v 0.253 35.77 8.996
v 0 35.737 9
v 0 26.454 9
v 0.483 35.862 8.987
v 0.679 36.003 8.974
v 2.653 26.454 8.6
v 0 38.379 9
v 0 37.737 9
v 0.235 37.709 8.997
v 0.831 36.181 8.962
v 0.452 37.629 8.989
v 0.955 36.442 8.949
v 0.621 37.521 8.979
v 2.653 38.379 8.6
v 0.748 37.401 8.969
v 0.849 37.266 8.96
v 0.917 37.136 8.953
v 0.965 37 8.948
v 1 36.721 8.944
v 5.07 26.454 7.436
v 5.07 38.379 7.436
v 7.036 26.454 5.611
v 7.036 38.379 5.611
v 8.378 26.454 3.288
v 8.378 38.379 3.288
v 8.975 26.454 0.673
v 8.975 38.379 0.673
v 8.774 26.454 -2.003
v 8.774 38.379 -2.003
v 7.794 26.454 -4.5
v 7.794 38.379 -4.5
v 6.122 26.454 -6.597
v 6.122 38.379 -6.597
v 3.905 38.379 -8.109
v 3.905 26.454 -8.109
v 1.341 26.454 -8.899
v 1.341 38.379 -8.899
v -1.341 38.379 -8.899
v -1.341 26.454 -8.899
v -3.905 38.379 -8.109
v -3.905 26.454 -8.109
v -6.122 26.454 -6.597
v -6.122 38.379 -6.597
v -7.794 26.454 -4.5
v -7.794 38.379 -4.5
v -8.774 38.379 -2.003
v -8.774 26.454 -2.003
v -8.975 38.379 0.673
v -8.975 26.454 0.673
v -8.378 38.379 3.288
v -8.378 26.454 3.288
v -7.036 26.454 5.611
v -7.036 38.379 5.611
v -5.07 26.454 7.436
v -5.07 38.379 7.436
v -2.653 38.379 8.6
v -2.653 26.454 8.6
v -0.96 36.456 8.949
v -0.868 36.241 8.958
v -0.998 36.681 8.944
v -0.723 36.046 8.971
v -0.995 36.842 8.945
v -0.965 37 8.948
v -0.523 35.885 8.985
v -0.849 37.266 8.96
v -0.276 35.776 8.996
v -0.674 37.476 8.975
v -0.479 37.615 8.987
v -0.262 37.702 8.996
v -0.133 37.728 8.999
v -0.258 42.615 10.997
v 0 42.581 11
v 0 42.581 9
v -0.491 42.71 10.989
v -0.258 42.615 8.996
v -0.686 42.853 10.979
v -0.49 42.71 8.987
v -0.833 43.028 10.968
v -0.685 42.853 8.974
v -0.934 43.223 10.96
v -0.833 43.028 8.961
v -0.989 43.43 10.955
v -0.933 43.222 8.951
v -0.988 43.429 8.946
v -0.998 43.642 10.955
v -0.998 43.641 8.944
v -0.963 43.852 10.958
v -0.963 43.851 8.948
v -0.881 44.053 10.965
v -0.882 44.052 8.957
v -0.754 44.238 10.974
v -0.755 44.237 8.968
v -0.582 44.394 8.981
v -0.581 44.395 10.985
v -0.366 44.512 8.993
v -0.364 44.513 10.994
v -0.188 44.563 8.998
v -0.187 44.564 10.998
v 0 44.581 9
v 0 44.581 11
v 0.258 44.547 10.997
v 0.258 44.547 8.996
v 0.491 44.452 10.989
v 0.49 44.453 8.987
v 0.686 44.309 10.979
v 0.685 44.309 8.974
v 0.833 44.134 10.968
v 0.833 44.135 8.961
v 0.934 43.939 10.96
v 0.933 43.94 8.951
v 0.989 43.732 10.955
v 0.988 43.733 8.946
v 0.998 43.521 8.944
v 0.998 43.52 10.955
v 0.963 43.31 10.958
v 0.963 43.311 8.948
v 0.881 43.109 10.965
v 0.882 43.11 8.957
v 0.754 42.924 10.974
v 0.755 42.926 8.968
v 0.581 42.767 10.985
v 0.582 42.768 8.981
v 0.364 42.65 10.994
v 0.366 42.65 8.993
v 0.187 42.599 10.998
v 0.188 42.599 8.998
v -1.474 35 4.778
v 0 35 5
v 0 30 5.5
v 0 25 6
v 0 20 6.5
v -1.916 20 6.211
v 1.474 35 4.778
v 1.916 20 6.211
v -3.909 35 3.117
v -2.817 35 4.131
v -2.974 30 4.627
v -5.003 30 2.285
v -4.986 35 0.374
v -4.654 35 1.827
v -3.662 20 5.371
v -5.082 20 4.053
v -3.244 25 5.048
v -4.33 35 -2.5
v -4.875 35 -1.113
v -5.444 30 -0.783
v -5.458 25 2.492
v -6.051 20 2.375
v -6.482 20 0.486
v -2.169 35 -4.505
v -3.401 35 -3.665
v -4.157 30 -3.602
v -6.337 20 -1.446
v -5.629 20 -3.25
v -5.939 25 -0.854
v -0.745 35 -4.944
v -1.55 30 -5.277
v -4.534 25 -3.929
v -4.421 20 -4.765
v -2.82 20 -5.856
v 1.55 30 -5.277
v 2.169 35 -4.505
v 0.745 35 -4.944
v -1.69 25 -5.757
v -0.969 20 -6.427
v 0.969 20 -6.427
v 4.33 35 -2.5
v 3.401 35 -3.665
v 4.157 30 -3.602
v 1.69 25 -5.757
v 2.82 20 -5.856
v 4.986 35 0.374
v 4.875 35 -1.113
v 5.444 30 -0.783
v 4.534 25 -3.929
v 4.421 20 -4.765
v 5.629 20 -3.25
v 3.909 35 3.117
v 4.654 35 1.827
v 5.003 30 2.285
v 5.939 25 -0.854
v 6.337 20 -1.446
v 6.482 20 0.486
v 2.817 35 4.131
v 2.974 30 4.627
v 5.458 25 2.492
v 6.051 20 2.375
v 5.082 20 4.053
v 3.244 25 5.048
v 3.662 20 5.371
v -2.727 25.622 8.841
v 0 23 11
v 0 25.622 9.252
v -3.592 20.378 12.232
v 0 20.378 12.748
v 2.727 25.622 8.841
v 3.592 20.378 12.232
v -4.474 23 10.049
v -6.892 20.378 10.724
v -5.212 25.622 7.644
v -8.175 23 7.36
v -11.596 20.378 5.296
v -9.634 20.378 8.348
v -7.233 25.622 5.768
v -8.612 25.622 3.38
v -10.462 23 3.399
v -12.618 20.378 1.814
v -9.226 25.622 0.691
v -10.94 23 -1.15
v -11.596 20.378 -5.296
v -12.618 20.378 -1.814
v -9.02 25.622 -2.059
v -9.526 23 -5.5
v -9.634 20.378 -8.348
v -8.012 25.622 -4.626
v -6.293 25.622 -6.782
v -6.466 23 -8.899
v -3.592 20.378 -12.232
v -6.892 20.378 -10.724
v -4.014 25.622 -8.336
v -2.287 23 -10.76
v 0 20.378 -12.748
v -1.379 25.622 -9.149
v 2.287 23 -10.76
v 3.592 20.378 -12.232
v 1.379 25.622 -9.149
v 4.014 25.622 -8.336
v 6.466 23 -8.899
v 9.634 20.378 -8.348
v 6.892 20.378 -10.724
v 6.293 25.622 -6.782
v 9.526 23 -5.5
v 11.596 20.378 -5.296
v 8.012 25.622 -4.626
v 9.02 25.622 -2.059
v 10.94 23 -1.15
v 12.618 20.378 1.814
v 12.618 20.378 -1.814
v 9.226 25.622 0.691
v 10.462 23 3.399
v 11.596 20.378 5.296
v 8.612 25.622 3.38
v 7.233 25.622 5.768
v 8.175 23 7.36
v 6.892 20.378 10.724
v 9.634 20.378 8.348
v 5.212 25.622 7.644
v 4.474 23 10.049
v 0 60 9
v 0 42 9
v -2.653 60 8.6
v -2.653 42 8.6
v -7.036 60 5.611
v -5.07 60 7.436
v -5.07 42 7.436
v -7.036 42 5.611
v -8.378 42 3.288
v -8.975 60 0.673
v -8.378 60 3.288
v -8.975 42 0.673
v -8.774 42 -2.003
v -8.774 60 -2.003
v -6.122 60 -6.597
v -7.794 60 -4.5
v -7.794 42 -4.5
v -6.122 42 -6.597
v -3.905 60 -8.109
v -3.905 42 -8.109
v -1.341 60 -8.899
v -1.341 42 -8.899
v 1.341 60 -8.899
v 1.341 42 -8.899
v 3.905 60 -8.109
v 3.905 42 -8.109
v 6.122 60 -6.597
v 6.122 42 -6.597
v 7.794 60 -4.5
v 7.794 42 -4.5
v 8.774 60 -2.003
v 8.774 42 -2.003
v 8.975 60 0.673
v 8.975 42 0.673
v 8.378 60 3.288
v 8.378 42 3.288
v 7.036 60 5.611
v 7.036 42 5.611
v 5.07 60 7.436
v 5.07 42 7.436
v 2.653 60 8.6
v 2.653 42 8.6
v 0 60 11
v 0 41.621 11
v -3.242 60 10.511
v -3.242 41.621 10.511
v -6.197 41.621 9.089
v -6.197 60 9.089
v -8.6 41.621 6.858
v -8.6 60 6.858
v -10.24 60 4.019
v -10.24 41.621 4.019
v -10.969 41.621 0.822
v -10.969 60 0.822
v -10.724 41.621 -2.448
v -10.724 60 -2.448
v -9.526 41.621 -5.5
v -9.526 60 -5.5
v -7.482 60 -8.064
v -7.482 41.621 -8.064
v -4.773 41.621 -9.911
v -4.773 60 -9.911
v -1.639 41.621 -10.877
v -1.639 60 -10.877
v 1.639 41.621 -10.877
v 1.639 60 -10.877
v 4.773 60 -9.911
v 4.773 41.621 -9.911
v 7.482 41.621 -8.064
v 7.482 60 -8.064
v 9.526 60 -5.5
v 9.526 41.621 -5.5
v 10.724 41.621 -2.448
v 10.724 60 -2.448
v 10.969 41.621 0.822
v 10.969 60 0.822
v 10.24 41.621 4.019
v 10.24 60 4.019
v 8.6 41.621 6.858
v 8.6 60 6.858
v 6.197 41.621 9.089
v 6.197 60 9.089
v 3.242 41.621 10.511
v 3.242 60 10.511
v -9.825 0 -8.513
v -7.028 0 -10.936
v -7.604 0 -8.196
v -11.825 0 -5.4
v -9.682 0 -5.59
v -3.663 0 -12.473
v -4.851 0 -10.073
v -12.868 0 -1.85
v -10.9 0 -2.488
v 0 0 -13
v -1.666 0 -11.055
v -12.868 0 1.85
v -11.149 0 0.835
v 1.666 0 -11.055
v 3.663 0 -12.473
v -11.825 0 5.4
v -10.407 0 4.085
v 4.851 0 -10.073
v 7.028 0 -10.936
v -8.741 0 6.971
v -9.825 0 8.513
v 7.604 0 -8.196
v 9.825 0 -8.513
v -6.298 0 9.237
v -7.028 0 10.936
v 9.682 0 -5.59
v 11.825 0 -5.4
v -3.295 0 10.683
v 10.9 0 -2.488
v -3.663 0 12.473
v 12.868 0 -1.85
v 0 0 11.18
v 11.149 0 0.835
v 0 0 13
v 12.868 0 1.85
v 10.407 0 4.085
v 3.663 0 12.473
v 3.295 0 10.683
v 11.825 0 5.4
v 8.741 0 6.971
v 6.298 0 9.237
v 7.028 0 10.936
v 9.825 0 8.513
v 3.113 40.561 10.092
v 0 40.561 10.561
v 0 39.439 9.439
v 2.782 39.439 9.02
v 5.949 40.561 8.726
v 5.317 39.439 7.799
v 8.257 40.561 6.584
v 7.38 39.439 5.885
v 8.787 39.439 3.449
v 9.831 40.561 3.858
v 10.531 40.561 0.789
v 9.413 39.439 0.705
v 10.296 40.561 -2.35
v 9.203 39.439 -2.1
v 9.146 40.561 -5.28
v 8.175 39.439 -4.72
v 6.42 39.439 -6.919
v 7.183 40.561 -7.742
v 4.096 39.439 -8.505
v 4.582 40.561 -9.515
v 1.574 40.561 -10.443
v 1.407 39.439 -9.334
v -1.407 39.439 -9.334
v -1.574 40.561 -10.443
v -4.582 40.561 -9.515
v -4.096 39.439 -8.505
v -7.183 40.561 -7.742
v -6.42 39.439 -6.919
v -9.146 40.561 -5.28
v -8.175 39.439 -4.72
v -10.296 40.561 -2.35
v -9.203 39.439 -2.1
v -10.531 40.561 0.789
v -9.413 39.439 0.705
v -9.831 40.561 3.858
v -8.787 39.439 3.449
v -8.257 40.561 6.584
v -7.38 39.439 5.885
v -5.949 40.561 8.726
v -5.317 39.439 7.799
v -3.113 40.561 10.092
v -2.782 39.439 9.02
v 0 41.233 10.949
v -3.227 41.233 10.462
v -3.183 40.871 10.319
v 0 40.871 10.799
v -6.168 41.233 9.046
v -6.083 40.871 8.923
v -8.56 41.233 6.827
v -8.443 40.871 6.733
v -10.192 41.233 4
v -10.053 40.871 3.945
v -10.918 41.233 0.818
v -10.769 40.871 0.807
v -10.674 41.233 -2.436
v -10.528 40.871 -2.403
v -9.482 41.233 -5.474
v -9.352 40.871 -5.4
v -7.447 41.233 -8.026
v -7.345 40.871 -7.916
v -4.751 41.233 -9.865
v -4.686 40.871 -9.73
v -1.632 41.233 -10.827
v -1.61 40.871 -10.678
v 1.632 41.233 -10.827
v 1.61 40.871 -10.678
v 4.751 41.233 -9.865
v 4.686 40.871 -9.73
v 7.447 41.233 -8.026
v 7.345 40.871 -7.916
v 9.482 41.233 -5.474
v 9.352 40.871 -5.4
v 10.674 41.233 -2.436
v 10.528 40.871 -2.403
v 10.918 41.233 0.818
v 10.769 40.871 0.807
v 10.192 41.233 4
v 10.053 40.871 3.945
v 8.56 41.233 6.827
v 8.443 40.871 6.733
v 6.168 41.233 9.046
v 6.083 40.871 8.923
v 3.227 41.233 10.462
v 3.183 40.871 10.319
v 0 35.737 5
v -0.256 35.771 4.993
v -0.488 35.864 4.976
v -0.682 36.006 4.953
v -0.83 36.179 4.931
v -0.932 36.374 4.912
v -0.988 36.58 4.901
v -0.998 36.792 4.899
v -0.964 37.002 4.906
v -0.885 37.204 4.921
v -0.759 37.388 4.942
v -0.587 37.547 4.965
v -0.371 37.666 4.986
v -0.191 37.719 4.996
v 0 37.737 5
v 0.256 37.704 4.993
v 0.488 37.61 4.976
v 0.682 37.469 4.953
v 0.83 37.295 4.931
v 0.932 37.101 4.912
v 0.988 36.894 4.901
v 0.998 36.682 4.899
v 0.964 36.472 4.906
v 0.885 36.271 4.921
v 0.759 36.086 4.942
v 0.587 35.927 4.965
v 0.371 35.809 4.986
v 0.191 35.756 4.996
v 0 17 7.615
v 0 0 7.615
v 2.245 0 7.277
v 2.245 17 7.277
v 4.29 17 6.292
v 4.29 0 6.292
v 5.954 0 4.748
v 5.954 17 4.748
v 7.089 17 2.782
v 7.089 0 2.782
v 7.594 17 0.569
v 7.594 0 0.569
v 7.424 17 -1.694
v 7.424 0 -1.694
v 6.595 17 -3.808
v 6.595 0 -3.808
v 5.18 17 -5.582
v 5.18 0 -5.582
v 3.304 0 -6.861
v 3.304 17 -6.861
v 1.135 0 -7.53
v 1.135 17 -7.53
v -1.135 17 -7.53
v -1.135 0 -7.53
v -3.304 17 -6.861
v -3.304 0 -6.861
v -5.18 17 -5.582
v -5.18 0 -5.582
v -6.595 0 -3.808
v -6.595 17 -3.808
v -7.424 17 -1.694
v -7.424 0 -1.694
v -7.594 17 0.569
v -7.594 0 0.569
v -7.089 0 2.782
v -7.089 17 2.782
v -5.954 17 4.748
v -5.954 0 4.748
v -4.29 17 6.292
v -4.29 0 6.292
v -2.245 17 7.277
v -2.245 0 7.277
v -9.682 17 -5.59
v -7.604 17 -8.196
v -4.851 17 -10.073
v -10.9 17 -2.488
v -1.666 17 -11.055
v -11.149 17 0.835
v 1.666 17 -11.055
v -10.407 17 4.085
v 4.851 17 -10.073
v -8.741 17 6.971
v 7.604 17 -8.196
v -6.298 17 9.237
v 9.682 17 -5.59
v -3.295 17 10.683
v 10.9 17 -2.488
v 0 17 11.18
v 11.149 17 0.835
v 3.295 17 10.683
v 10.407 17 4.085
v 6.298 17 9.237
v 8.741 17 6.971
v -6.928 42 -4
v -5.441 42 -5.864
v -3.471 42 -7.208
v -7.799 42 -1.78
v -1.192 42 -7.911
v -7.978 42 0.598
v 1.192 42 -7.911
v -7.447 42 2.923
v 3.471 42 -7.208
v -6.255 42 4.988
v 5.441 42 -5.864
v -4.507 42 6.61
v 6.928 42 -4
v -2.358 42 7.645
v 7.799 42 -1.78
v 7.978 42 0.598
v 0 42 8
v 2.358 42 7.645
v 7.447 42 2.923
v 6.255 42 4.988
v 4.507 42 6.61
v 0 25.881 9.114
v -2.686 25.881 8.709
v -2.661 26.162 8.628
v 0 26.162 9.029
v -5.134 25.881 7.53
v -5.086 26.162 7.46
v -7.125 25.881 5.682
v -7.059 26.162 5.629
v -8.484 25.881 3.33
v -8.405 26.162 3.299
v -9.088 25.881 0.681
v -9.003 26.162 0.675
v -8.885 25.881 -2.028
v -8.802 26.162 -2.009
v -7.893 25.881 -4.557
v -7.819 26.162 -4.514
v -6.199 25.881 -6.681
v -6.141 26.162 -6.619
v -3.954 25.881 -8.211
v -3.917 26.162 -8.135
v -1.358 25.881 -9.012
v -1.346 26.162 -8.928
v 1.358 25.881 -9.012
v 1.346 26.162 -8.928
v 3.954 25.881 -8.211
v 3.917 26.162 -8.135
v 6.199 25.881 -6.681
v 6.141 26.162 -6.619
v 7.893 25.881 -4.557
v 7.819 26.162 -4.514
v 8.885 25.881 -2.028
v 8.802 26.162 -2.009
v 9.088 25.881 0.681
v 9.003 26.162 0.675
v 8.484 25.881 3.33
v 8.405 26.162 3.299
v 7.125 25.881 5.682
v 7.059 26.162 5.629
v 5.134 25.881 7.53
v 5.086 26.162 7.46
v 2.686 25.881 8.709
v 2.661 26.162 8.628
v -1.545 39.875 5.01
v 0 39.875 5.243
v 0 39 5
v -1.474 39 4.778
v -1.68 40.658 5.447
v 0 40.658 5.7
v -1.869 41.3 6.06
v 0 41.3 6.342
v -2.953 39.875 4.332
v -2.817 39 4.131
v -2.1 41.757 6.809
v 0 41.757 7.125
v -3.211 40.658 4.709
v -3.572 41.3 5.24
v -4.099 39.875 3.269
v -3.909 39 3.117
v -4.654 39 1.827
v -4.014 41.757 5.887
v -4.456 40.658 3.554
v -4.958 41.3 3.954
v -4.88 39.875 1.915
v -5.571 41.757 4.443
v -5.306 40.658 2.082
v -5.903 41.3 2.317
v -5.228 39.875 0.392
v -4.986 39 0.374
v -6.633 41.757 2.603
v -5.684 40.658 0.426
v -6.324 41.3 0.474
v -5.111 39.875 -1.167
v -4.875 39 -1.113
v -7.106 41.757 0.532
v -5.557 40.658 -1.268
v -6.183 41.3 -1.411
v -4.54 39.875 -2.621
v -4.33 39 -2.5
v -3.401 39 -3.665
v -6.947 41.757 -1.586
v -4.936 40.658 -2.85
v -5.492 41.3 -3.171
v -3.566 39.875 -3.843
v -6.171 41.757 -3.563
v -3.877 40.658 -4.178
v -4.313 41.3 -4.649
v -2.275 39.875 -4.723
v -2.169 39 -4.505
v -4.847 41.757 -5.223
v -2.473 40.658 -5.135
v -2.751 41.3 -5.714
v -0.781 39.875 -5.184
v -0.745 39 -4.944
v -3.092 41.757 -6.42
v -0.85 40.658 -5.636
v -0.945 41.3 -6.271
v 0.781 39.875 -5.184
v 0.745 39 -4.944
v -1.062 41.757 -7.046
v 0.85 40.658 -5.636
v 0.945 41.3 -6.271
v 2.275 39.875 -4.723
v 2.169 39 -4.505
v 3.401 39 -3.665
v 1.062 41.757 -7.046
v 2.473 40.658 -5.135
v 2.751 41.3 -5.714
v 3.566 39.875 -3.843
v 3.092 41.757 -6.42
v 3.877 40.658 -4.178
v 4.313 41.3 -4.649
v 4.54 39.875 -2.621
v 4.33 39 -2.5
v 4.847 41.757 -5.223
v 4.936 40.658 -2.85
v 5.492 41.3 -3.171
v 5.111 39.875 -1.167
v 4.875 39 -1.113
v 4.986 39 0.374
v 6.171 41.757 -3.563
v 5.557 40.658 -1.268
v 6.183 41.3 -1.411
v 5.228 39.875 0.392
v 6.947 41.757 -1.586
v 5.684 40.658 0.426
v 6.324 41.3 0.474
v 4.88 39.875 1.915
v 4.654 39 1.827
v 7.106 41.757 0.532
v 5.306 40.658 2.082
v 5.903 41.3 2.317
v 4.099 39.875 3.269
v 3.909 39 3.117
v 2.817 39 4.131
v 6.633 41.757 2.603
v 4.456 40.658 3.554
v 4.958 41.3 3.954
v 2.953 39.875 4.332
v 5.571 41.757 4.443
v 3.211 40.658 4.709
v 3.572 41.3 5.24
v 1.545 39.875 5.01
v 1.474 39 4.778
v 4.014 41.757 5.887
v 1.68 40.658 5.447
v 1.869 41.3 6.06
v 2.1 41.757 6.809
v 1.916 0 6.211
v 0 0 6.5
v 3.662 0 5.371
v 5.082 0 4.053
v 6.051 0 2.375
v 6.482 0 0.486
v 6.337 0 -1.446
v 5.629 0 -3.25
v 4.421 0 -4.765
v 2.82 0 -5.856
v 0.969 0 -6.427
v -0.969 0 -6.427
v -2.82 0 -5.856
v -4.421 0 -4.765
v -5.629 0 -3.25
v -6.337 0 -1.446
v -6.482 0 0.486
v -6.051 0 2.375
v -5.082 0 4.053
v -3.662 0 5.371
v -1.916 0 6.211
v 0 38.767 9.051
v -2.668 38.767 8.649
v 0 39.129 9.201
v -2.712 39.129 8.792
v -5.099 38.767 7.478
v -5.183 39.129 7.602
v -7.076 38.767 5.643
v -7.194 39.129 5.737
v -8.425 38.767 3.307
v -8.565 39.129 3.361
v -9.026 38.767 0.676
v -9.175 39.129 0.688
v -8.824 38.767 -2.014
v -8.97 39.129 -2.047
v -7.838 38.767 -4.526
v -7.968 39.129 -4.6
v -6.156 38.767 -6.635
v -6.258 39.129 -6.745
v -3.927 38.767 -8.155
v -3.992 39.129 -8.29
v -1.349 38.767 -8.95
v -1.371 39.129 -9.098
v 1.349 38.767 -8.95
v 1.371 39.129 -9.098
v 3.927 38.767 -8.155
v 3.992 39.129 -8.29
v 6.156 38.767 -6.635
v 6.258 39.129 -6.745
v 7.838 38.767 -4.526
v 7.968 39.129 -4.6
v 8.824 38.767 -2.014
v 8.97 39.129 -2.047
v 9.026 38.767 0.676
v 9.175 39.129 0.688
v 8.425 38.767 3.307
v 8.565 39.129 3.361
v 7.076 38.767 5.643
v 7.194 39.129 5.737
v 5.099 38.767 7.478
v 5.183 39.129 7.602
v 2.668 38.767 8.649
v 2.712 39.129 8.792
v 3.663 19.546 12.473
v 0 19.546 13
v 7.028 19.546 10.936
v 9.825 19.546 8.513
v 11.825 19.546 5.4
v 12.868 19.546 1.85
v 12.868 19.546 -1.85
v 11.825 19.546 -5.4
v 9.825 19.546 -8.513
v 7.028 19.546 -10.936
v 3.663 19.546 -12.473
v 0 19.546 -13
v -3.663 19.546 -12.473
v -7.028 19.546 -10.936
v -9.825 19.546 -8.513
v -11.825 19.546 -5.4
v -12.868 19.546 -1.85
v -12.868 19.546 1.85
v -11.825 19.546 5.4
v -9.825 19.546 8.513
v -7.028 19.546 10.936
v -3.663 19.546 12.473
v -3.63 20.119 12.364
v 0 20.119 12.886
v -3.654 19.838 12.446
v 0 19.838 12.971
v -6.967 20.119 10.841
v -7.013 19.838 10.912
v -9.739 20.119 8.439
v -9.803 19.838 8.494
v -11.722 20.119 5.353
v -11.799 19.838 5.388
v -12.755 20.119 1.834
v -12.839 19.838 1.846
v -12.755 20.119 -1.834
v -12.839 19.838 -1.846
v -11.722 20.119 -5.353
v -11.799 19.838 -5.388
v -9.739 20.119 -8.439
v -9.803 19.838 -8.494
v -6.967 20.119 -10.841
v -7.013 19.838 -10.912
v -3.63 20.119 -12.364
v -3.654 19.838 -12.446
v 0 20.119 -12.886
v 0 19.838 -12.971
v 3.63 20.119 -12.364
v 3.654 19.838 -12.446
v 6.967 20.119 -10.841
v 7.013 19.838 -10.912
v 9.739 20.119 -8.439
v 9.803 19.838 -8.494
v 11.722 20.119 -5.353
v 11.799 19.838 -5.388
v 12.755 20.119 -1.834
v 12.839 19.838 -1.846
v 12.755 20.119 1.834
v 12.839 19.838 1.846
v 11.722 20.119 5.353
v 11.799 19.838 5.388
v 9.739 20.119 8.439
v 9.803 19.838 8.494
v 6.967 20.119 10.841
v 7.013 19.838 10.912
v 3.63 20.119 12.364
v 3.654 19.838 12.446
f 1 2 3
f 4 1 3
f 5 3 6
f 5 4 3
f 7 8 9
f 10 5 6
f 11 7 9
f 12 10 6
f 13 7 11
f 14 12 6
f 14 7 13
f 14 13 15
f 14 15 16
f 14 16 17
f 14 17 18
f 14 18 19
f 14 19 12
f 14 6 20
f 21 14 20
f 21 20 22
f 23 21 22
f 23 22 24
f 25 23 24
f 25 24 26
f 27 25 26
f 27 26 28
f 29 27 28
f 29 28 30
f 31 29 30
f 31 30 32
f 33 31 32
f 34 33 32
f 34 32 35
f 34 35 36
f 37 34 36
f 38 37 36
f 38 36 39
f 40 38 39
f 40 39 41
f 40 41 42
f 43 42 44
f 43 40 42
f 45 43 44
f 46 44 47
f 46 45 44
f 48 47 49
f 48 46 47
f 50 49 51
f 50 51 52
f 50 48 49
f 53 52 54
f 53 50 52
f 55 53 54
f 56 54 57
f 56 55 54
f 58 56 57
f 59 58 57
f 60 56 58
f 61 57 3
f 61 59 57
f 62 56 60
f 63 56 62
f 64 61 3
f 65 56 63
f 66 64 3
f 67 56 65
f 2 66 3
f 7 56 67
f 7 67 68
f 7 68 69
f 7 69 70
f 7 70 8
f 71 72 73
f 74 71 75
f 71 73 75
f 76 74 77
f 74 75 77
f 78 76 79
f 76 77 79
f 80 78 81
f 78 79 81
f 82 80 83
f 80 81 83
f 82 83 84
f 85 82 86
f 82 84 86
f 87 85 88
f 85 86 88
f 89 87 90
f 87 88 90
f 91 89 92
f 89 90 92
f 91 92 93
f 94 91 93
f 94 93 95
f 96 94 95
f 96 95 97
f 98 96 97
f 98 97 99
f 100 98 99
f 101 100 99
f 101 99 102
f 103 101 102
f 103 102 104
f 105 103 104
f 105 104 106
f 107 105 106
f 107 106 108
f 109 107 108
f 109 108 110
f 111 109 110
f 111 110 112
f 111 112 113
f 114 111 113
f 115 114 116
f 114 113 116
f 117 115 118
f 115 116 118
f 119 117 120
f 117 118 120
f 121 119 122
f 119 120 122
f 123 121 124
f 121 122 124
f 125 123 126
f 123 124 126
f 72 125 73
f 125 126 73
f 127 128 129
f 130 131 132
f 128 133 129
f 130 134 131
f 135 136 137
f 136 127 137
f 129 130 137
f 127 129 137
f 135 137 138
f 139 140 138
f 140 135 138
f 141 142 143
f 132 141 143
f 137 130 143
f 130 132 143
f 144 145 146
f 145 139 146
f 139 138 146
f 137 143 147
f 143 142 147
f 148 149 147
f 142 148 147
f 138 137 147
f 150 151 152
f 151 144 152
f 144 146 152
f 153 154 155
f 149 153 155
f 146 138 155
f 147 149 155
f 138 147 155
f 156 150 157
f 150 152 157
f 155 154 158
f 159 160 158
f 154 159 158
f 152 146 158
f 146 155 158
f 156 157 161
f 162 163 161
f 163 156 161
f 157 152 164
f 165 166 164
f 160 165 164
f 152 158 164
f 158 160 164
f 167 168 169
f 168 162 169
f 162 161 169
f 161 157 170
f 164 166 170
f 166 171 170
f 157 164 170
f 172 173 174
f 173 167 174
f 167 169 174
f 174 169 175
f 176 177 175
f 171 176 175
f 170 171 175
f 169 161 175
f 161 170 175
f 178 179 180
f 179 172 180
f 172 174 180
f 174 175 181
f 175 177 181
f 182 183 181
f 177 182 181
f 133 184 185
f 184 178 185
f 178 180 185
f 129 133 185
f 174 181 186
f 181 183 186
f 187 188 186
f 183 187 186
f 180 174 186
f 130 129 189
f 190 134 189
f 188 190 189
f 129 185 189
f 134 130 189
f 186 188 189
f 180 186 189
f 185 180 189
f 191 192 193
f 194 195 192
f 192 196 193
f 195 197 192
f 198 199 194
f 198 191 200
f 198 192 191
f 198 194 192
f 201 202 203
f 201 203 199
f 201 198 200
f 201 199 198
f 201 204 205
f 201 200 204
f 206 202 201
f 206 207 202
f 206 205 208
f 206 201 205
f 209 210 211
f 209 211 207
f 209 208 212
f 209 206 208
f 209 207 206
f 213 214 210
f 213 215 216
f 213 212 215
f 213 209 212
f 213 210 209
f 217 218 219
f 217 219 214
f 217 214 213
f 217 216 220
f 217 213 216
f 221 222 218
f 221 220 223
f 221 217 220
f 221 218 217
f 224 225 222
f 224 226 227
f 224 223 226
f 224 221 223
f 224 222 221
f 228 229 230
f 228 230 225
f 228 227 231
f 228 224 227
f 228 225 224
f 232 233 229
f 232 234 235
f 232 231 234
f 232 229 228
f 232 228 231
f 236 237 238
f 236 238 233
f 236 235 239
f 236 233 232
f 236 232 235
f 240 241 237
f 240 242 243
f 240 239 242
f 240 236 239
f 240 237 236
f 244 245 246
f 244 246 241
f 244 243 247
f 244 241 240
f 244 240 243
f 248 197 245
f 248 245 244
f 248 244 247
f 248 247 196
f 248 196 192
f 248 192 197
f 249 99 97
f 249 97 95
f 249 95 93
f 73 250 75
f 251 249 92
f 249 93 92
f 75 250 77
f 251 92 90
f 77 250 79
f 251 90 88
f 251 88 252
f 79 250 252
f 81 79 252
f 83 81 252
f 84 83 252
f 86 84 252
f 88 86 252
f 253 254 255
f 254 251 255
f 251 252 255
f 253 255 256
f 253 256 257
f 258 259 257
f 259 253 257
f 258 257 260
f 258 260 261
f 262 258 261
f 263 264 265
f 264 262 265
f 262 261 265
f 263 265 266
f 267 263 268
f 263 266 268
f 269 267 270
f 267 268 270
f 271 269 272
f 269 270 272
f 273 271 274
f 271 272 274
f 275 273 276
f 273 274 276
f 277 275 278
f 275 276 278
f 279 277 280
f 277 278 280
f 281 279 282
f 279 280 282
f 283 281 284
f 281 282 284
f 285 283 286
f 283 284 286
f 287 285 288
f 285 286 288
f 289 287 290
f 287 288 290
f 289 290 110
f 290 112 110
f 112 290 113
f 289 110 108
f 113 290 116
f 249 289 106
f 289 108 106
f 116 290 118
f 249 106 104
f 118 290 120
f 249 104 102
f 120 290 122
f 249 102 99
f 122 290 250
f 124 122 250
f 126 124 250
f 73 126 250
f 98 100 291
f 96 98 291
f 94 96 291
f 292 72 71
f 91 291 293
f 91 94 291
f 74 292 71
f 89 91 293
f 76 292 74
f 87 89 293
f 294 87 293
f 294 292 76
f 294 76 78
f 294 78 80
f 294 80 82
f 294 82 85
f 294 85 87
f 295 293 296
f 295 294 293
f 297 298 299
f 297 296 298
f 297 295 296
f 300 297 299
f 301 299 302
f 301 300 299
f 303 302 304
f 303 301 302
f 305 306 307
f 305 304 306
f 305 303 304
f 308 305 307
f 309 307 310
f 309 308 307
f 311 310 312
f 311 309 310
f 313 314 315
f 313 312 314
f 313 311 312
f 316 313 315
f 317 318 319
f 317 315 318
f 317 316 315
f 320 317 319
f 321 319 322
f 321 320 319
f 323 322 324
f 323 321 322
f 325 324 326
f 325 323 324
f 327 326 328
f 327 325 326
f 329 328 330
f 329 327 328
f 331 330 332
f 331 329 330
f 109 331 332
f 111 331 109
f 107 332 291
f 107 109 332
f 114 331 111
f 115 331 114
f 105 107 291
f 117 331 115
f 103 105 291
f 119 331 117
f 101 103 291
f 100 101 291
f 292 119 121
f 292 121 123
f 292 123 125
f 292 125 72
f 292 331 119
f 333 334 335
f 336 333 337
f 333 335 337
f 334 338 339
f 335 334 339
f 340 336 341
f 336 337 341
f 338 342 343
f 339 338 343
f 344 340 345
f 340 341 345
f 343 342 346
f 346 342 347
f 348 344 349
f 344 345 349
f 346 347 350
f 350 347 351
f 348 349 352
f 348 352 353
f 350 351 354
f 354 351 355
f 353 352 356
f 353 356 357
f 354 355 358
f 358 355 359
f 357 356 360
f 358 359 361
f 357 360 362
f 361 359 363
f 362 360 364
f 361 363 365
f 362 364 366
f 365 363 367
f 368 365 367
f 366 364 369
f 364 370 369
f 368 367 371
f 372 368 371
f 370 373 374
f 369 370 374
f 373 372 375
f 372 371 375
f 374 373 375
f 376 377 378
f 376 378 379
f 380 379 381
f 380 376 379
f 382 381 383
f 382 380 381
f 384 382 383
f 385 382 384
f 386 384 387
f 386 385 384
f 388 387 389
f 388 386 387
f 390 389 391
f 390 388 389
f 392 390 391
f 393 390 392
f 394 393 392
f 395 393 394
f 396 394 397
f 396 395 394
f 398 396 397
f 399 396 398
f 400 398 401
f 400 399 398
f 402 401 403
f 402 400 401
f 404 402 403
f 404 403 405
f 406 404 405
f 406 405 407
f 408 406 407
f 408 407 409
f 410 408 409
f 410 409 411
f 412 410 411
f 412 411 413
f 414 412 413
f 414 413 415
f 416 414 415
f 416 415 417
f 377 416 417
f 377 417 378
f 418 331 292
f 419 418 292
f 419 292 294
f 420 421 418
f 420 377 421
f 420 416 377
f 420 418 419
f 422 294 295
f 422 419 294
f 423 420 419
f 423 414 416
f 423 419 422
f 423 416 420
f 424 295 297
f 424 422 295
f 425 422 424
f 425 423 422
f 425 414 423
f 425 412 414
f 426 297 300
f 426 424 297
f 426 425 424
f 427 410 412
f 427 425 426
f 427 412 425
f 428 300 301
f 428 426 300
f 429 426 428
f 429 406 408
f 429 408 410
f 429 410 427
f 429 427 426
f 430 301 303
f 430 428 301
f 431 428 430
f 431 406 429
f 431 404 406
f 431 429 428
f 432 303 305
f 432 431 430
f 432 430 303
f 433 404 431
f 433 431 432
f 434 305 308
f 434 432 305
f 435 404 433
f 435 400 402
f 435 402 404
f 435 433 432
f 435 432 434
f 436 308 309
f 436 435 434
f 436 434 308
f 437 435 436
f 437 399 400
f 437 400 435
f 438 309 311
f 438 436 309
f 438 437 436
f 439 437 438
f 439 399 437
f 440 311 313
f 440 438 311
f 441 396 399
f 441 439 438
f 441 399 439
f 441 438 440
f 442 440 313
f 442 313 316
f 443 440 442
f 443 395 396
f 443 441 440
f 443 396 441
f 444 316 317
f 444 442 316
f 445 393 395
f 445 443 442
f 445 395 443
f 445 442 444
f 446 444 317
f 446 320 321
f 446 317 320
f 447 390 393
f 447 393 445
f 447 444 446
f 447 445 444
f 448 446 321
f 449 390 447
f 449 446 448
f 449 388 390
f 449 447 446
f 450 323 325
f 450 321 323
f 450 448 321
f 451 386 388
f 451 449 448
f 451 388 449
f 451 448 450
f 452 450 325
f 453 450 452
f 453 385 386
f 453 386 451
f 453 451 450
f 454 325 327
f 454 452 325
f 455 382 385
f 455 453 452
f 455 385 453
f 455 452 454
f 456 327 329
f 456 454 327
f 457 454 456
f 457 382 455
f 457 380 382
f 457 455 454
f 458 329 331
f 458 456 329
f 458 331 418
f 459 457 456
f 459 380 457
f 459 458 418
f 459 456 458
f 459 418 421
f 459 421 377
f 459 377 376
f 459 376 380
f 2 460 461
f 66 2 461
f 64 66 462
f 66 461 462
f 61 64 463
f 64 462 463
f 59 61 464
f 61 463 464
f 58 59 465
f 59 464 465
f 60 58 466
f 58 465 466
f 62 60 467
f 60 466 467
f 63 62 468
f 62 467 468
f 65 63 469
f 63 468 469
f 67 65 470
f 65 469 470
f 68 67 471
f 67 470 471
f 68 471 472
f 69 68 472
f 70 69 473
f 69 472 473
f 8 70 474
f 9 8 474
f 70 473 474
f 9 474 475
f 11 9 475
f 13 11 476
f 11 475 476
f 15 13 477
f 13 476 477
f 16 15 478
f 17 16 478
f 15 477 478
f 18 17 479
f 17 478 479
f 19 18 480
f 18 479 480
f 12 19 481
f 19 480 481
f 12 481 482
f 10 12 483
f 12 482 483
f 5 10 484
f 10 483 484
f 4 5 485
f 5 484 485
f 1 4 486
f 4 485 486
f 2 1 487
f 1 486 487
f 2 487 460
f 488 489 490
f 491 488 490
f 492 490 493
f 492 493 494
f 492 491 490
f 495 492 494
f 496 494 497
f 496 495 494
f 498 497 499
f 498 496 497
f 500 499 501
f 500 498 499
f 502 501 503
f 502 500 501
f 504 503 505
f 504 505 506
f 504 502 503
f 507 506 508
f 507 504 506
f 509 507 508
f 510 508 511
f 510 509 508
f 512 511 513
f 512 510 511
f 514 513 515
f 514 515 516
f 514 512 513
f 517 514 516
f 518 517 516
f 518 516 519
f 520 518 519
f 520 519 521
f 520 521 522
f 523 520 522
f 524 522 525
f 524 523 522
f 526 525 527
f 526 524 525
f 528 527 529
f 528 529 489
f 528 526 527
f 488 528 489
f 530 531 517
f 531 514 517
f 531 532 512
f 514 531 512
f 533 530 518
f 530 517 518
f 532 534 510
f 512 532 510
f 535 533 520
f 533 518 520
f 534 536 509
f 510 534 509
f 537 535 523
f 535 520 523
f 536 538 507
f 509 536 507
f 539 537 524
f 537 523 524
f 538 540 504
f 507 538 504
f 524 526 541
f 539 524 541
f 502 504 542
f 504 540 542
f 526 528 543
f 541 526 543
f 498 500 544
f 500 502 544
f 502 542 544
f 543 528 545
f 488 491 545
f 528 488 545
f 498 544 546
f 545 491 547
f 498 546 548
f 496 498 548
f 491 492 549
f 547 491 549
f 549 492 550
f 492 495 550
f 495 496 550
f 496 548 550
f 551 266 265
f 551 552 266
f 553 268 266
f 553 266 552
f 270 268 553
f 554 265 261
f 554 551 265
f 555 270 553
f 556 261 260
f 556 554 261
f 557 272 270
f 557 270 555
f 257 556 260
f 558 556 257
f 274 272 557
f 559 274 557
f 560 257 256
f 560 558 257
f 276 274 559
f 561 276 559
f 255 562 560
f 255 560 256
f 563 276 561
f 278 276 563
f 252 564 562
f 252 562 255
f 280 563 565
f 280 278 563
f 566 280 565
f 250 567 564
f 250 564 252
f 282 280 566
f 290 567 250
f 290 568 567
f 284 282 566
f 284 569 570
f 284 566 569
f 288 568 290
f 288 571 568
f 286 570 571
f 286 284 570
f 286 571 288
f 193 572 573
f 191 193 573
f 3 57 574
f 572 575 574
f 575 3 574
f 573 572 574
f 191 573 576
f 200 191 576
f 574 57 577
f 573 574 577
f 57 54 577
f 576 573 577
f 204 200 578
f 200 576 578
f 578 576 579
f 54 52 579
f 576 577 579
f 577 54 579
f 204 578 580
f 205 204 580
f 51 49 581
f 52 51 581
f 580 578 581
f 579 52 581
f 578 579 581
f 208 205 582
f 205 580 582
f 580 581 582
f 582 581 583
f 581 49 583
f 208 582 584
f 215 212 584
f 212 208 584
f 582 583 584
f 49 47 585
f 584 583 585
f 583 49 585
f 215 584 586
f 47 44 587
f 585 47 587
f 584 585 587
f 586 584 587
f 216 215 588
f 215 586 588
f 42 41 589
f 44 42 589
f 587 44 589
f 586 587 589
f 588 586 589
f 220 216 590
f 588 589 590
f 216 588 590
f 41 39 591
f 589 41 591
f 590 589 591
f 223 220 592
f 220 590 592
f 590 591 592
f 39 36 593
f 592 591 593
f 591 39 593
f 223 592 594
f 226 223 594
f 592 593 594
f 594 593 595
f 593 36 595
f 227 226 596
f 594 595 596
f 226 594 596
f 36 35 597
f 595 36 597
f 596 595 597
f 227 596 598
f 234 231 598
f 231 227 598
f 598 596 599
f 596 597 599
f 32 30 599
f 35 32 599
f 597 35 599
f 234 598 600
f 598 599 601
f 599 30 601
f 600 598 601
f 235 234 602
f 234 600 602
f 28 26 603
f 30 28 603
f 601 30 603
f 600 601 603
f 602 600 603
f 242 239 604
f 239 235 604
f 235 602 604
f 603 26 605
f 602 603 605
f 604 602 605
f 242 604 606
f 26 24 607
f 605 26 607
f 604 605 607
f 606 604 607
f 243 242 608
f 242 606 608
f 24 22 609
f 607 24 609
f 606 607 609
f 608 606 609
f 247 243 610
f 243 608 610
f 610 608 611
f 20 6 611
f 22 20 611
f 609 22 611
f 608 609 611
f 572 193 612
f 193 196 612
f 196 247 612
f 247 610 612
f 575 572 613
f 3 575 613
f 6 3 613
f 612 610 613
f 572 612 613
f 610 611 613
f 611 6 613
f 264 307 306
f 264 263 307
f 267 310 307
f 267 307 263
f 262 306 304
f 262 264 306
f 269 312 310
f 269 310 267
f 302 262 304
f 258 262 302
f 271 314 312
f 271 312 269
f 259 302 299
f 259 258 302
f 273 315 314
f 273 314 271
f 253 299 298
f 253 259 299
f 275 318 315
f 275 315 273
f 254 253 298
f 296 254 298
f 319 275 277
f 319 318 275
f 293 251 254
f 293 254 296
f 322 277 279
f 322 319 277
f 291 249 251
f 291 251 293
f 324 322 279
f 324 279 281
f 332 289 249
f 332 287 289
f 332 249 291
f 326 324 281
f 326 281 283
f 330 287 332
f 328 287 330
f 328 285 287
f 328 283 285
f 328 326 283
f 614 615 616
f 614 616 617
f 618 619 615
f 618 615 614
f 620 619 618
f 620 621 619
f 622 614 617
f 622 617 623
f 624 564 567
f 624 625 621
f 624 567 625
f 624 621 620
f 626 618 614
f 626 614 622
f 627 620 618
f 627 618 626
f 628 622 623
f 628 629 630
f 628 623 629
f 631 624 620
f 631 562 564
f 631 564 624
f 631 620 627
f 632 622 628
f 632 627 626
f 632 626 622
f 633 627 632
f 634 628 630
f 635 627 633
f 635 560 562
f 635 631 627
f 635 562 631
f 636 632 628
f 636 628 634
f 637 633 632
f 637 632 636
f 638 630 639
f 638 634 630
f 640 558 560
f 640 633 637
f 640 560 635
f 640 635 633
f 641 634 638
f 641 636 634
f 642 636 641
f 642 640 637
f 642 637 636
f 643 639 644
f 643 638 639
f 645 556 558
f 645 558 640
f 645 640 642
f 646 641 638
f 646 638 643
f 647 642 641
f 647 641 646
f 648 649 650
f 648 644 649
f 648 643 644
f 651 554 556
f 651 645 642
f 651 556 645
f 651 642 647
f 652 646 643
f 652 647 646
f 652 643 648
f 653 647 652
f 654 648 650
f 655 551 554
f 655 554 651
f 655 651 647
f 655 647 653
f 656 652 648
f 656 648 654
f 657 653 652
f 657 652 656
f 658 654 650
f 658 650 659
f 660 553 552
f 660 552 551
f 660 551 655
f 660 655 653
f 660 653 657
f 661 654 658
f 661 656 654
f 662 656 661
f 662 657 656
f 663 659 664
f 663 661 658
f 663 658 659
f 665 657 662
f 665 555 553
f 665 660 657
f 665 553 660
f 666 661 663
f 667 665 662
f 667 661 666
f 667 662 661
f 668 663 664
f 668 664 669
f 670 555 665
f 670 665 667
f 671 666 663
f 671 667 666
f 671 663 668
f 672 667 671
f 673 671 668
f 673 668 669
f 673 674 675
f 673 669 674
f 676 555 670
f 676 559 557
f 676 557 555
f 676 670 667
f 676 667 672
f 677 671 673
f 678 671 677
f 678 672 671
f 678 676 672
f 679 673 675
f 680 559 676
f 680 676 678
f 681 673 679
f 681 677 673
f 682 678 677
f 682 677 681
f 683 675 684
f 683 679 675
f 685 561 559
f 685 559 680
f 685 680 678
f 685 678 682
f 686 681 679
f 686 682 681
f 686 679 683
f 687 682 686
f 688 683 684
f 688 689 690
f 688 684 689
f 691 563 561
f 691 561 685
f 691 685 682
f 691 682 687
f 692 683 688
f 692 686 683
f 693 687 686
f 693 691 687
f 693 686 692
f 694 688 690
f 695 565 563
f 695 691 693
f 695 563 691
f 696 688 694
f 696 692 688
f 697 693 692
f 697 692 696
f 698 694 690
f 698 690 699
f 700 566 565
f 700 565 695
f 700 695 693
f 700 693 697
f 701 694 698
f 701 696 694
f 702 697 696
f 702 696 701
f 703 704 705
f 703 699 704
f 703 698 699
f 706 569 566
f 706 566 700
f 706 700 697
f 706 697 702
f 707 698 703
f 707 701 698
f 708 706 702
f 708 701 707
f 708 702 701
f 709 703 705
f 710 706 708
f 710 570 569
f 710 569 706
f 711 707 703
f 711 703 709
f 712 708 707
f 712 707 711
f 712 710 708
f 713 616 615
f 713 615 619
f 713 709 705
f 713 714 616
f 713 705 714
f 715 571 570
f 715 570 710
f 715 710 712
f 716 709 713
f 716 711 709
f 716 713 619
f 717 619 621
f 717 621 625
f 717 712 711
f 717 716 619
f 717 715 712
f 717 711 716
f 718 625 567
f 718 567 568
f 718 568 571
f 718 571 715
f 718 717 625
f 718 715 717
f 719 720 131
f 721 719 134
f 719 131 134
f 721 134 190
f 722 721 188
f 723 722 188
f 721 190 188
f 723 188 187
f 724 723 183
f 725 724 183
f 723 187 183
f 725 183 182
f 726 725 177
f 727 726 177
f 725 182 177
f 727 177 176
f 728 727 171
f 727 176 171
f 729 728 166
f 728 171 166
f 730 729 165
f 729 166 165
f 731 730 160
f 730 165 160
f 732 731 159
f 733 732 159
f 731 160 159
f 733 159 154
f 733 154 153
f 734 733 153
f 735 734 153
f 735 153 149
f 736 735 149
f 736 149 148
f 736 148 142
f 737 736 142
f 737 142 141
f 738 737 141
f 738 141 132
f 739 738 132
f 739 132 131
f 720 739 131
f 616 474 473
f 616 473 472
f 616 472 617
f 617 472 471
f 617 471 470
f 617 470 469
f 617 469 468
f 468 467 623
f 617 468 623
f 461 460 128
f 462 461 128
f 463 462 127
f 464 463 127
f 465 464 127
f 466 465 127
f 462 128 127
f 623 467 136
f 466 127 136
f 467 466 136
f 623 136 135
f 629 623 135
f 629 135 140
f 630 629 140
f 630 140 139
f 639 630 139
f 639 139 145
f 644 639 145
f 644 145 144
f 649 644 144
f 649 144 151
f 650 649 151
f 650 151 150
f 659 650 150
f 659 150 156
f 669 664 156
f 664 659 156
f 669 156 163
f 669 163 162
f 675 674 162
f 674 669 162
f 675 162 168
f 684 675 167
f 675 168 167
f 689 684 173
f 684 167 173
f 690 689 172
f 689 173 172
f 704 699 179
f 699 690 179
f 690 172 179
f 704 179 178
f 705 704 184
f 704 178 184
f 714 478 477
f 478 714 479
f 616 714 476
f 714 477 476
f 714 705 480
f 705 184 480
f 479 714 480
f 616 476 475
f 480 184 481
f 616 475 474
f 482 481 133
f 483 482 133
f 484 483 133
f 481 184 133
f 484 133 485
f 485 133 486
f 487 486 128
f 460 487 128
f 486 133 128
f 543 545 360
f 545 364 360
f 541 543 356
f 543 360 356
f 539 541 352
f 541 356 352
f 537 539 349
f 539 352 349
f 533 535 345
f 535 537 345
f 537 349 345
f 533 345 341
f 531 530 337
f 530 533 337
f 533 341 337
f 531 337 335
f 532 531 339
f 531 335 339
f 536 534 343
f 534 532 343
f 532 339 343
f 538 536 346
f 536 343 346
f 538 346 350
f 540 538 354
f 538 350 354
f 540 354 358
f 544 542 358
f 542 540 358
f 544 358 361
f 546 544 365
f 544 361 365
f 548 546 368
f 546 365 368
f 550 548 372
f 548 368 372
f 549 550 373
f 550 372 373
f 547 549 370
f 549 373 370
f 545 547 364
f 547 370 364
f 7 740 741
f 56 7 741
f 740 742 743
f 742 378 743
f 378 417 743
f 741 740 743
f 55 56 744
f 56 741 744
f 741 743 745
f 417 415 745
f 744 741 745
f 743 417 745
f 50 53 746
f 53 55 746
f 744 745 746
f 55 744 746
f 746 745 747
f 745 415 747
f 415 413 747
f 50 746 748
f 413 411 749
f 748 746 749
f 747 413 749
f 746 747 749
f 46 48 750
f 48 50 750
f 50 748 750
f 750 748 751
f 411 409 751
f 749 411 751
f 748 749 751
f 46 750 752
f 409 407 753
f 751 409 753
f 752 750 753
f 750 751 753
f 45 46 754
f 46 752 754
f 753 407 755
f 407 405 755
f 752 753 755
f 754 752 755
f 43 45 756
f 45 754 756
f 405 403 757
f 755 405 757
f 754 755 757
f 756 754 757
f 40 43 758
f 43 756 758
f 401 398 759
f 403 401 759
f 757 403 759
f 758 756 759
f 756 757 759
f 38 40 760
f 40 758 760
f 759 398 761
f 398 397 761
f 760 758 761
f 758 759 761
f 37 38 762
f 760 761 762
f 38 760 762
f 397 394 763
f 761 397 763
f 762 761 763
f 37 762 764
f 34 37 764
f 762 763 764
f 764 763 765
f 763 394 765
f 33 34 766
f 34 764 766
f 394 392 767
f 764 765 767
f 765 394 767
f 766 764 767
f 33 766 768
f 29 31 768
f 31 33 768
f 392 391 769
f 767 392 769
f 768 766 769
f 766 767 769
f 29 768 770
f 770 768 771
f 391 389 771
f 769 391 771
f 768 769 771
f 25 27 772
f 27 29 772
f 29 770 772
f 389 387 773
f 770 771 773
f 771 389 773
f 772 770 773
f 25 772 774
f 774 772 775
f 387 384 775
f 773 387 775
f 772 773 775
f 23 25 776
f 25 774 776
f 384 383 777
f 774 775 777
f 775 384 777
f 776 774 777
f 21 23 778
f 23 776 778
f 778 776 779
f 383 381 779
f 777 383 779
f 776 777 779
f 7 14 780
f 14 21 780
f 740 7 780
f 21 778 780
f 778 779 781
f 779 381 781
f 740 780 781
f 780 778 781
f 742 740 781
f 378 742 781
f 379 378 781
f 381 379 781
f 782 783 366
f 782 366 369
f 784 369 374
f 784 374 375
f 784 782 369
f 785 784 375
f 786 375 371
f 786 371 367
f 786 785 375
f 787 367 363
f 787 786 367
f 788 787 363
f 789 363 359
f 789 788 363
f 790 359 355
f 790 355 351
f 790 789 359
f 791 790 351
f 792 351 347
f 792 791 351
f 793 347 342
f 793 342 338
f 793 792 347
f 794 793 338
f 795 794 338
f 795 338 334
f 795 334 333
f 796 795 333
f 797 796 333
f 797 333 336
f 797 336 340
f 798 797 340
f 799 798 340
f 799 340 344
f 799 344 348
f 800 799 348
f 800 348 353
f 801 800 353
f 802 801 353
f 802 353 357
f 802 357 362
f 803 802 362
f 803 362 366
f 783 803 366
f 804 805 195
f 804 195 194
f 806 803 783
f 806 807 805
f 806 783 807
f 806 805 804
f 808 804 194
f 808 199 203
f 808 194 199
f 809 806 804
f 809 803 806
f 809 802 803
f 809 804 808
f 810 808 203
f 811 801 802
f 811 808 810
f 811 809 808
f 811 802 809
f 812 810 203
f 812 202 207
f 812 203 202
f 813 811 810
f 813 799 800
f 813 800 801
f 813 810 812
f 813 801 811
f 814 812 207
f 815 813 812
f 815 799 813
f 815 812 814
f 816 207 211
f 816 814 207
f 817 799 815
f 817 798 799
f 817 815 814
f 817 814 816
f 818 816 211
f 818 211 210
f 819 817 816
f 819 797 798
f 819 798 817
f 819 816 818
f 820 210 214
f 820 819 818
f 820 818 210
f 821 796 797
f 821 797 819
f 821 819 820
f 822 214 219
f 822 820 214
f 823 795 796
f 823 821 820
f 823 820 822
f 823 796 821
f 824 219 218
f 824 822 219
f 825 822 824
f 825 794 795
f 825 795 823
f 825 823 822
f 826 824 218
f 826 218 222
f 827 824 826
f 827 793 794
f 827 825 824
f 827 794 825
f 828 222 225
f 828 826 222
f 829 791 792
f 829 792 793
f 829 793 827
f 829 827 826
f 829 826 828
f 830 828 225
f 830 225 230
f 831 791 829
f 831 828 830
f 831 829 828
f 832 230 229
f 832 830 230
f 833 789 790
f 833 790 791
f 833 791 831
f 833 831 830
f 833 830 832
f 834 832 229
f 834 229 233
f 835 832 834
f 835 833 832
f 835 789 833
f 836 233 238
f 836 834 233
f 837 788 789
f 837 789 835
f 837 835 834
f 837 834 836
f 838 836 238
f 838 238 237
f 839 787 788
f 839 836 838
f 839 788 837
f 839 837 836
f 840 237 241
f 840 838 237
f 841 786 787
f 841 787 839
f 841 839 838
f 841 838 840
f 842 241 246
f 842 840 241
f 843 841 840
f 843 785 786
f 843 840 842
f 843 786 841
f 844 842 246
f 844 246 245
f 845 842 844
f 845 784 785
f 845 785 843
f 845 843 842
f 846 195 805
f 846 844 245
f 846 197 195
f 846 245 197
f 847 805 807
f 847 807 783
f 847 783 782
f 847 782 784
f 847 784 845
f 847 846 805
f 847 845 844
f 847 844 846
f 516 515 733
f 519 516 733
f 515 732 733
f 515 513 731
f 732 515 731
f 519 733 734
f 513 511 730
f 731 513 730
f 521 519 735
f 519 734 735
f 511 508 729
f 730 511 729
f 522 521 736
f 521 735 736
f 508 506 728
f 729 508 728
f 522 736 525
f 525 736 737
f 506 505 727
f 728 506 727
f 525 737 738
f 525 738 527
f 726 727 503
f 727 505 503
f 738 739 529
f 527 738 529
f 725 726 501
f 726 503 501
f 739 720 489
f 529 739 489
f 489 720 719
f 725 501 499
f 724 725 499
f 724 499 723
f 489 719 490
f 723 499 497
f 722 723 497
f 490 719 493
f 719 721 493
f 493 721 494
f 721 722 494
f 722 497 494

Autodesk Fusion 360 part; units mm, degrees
sketch "Skizze1" plane through (0, 0, 0) normal (1, 0, 0) x (0, 0, -1)
  line L0 (-13, 0) -> (-13, 19)
  line L1 (-11.18, 17.291) -> (-11.18, 0)
  line L2 (-11.18, 0) -> (-13, 0)
  line L3 (0, 0) -> (-7.615, 0)
  line L4 (-7.615, 0) -> (-6.5, 0)
  line L5 (-7.615, 0) -> (-7.615, 17)
  line L6 (-7.615, 17) -> (-11.18, 17)
  line L7 (-6.5, 0) -> (-6.5, 20)
  line L8 (0, 0) -> (0, 53.458)
  line L9 (-6.5, 20) -> (-5, 35)
  line L10 (-11, 60) -> (-11, 43)
  line L11 (-13, 19) -> (-13, 19.5458)
  line L12 (-11, 60) -> (-9, 60)
  line L13 (-9, 60) -> (-9, 42)
  arc A0 (-5, 39) -> (-8, 42) centre (-8.5, 38.5) ccw
  line L14 (-9, 42) -> (-8, 42)
  line L15 (-5, 39) -> (-5, 35)
  line L16 (-12.7481, 20.3779) -> (-11, 23)
  line L17 (-11, 23) -> (-9.2519, 25.6221)
  line L18 (-9, 26.4542) -> (-9, 37)
  line L19 (-11, 43) -> (-11, 41.6213)
  line L20 (-10.5607, 40.5607) -> (-9.4393, 39.4393)
  line L21 (-9, 38.3787) -> (-9, 37)
  arc A1 (-11, 41.6213) -> (-10.5607, 40.5607) centre (-9.5, 41.6213) ccw
  arc A2 (-9, 38.3787) -> (-9.4393, 39.4393) centre (-10.5, 38.3787) ccw
  arc A3 (-9.2519, 25.6221) -> (-9, 26.4542) centre (-10.5, 26.4542) ccw
  arc A4 (-12.7481, 20.3779) -> (-13, 19.5458) centre (-11.5, 19.5458) ccw
  dimension "d3" = 7.615
  dimension "d4" = 1.115
  dimension "d7" = 1.5
revolve "Drehen1" add sketch "Skizze1" angle 360 about axis through (0, 0, 0) along (0, 1, 0)
hole "Bohrung1" at (0, 36.7372, 9) direction (0, 0, -1) diameter 2 depth 9 tip angle 118
hole "Bohrung2" at (0, 43.5811, 11) direction (0, 0, -1) diameter 2 depth 9 tip angle 118
